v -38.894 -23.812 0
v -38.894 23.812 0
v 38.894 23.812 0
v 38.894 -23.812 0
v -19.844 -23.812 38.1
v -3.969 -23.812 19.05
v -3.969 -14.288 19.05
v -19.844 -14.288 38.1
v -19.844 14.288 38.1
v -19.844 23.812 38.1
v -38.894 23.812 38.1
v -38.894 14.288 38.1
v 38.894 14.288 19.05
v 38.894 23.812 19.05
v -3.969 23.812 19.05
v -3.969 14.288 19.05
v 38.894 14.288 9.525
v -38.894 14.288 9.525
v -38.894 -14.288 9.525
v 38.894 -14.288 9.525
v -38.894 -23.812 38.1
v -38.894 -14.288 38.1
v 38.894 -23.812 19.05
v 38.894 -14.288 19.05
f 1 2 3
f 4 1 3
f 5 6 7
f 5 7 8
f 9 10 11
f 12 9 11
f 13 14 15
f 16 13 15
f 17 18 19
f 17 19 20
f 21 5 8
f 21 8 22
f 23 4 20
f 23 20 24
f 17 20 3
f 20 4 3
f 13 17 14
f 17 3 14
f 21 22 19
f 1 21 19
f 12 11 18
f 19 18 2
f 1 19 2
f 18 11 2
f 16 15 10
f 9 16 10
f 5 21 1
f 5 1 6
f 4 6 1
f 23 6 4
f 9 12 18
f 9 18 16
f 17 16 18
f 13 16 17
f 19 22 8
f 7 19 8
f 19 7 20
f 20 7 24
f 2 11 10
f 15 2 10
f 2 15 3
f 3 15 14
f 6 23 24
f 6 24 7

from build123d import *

# Parameters (mm, degrees)
F0_W     = 77.7875
F0_H     = 47.625
F1_DEPTH = 9.525
F3_DEPTH = 9.525


with BuildPart() as f1:
    # F0 (on Top) → F1 (new body)
    with BuildSketch(Plane.XY):
        Rectangle(F0_W, F0_H)
    extrude(amount=F1_DEPTH)

    # F2 (on face) → F3 (join)
    with BuildSketch(Plane.XZ.offset(23.8125)):
        Polygon((-38.89375, 38.1), (-38.89375, 9.525), (38.89375, 9.525), (38.89375, 19.05), (-3.96875, 19.05), (-19.84375, 38.1), align=None)
    extrude(amount=-F3_DEPTH)

    # F4: F1 across plane


with BuildPart() as f1_1:
    add(f1.part)
    add(f1.part.mirror(Plane.XZ))


solid = f1_1.part
